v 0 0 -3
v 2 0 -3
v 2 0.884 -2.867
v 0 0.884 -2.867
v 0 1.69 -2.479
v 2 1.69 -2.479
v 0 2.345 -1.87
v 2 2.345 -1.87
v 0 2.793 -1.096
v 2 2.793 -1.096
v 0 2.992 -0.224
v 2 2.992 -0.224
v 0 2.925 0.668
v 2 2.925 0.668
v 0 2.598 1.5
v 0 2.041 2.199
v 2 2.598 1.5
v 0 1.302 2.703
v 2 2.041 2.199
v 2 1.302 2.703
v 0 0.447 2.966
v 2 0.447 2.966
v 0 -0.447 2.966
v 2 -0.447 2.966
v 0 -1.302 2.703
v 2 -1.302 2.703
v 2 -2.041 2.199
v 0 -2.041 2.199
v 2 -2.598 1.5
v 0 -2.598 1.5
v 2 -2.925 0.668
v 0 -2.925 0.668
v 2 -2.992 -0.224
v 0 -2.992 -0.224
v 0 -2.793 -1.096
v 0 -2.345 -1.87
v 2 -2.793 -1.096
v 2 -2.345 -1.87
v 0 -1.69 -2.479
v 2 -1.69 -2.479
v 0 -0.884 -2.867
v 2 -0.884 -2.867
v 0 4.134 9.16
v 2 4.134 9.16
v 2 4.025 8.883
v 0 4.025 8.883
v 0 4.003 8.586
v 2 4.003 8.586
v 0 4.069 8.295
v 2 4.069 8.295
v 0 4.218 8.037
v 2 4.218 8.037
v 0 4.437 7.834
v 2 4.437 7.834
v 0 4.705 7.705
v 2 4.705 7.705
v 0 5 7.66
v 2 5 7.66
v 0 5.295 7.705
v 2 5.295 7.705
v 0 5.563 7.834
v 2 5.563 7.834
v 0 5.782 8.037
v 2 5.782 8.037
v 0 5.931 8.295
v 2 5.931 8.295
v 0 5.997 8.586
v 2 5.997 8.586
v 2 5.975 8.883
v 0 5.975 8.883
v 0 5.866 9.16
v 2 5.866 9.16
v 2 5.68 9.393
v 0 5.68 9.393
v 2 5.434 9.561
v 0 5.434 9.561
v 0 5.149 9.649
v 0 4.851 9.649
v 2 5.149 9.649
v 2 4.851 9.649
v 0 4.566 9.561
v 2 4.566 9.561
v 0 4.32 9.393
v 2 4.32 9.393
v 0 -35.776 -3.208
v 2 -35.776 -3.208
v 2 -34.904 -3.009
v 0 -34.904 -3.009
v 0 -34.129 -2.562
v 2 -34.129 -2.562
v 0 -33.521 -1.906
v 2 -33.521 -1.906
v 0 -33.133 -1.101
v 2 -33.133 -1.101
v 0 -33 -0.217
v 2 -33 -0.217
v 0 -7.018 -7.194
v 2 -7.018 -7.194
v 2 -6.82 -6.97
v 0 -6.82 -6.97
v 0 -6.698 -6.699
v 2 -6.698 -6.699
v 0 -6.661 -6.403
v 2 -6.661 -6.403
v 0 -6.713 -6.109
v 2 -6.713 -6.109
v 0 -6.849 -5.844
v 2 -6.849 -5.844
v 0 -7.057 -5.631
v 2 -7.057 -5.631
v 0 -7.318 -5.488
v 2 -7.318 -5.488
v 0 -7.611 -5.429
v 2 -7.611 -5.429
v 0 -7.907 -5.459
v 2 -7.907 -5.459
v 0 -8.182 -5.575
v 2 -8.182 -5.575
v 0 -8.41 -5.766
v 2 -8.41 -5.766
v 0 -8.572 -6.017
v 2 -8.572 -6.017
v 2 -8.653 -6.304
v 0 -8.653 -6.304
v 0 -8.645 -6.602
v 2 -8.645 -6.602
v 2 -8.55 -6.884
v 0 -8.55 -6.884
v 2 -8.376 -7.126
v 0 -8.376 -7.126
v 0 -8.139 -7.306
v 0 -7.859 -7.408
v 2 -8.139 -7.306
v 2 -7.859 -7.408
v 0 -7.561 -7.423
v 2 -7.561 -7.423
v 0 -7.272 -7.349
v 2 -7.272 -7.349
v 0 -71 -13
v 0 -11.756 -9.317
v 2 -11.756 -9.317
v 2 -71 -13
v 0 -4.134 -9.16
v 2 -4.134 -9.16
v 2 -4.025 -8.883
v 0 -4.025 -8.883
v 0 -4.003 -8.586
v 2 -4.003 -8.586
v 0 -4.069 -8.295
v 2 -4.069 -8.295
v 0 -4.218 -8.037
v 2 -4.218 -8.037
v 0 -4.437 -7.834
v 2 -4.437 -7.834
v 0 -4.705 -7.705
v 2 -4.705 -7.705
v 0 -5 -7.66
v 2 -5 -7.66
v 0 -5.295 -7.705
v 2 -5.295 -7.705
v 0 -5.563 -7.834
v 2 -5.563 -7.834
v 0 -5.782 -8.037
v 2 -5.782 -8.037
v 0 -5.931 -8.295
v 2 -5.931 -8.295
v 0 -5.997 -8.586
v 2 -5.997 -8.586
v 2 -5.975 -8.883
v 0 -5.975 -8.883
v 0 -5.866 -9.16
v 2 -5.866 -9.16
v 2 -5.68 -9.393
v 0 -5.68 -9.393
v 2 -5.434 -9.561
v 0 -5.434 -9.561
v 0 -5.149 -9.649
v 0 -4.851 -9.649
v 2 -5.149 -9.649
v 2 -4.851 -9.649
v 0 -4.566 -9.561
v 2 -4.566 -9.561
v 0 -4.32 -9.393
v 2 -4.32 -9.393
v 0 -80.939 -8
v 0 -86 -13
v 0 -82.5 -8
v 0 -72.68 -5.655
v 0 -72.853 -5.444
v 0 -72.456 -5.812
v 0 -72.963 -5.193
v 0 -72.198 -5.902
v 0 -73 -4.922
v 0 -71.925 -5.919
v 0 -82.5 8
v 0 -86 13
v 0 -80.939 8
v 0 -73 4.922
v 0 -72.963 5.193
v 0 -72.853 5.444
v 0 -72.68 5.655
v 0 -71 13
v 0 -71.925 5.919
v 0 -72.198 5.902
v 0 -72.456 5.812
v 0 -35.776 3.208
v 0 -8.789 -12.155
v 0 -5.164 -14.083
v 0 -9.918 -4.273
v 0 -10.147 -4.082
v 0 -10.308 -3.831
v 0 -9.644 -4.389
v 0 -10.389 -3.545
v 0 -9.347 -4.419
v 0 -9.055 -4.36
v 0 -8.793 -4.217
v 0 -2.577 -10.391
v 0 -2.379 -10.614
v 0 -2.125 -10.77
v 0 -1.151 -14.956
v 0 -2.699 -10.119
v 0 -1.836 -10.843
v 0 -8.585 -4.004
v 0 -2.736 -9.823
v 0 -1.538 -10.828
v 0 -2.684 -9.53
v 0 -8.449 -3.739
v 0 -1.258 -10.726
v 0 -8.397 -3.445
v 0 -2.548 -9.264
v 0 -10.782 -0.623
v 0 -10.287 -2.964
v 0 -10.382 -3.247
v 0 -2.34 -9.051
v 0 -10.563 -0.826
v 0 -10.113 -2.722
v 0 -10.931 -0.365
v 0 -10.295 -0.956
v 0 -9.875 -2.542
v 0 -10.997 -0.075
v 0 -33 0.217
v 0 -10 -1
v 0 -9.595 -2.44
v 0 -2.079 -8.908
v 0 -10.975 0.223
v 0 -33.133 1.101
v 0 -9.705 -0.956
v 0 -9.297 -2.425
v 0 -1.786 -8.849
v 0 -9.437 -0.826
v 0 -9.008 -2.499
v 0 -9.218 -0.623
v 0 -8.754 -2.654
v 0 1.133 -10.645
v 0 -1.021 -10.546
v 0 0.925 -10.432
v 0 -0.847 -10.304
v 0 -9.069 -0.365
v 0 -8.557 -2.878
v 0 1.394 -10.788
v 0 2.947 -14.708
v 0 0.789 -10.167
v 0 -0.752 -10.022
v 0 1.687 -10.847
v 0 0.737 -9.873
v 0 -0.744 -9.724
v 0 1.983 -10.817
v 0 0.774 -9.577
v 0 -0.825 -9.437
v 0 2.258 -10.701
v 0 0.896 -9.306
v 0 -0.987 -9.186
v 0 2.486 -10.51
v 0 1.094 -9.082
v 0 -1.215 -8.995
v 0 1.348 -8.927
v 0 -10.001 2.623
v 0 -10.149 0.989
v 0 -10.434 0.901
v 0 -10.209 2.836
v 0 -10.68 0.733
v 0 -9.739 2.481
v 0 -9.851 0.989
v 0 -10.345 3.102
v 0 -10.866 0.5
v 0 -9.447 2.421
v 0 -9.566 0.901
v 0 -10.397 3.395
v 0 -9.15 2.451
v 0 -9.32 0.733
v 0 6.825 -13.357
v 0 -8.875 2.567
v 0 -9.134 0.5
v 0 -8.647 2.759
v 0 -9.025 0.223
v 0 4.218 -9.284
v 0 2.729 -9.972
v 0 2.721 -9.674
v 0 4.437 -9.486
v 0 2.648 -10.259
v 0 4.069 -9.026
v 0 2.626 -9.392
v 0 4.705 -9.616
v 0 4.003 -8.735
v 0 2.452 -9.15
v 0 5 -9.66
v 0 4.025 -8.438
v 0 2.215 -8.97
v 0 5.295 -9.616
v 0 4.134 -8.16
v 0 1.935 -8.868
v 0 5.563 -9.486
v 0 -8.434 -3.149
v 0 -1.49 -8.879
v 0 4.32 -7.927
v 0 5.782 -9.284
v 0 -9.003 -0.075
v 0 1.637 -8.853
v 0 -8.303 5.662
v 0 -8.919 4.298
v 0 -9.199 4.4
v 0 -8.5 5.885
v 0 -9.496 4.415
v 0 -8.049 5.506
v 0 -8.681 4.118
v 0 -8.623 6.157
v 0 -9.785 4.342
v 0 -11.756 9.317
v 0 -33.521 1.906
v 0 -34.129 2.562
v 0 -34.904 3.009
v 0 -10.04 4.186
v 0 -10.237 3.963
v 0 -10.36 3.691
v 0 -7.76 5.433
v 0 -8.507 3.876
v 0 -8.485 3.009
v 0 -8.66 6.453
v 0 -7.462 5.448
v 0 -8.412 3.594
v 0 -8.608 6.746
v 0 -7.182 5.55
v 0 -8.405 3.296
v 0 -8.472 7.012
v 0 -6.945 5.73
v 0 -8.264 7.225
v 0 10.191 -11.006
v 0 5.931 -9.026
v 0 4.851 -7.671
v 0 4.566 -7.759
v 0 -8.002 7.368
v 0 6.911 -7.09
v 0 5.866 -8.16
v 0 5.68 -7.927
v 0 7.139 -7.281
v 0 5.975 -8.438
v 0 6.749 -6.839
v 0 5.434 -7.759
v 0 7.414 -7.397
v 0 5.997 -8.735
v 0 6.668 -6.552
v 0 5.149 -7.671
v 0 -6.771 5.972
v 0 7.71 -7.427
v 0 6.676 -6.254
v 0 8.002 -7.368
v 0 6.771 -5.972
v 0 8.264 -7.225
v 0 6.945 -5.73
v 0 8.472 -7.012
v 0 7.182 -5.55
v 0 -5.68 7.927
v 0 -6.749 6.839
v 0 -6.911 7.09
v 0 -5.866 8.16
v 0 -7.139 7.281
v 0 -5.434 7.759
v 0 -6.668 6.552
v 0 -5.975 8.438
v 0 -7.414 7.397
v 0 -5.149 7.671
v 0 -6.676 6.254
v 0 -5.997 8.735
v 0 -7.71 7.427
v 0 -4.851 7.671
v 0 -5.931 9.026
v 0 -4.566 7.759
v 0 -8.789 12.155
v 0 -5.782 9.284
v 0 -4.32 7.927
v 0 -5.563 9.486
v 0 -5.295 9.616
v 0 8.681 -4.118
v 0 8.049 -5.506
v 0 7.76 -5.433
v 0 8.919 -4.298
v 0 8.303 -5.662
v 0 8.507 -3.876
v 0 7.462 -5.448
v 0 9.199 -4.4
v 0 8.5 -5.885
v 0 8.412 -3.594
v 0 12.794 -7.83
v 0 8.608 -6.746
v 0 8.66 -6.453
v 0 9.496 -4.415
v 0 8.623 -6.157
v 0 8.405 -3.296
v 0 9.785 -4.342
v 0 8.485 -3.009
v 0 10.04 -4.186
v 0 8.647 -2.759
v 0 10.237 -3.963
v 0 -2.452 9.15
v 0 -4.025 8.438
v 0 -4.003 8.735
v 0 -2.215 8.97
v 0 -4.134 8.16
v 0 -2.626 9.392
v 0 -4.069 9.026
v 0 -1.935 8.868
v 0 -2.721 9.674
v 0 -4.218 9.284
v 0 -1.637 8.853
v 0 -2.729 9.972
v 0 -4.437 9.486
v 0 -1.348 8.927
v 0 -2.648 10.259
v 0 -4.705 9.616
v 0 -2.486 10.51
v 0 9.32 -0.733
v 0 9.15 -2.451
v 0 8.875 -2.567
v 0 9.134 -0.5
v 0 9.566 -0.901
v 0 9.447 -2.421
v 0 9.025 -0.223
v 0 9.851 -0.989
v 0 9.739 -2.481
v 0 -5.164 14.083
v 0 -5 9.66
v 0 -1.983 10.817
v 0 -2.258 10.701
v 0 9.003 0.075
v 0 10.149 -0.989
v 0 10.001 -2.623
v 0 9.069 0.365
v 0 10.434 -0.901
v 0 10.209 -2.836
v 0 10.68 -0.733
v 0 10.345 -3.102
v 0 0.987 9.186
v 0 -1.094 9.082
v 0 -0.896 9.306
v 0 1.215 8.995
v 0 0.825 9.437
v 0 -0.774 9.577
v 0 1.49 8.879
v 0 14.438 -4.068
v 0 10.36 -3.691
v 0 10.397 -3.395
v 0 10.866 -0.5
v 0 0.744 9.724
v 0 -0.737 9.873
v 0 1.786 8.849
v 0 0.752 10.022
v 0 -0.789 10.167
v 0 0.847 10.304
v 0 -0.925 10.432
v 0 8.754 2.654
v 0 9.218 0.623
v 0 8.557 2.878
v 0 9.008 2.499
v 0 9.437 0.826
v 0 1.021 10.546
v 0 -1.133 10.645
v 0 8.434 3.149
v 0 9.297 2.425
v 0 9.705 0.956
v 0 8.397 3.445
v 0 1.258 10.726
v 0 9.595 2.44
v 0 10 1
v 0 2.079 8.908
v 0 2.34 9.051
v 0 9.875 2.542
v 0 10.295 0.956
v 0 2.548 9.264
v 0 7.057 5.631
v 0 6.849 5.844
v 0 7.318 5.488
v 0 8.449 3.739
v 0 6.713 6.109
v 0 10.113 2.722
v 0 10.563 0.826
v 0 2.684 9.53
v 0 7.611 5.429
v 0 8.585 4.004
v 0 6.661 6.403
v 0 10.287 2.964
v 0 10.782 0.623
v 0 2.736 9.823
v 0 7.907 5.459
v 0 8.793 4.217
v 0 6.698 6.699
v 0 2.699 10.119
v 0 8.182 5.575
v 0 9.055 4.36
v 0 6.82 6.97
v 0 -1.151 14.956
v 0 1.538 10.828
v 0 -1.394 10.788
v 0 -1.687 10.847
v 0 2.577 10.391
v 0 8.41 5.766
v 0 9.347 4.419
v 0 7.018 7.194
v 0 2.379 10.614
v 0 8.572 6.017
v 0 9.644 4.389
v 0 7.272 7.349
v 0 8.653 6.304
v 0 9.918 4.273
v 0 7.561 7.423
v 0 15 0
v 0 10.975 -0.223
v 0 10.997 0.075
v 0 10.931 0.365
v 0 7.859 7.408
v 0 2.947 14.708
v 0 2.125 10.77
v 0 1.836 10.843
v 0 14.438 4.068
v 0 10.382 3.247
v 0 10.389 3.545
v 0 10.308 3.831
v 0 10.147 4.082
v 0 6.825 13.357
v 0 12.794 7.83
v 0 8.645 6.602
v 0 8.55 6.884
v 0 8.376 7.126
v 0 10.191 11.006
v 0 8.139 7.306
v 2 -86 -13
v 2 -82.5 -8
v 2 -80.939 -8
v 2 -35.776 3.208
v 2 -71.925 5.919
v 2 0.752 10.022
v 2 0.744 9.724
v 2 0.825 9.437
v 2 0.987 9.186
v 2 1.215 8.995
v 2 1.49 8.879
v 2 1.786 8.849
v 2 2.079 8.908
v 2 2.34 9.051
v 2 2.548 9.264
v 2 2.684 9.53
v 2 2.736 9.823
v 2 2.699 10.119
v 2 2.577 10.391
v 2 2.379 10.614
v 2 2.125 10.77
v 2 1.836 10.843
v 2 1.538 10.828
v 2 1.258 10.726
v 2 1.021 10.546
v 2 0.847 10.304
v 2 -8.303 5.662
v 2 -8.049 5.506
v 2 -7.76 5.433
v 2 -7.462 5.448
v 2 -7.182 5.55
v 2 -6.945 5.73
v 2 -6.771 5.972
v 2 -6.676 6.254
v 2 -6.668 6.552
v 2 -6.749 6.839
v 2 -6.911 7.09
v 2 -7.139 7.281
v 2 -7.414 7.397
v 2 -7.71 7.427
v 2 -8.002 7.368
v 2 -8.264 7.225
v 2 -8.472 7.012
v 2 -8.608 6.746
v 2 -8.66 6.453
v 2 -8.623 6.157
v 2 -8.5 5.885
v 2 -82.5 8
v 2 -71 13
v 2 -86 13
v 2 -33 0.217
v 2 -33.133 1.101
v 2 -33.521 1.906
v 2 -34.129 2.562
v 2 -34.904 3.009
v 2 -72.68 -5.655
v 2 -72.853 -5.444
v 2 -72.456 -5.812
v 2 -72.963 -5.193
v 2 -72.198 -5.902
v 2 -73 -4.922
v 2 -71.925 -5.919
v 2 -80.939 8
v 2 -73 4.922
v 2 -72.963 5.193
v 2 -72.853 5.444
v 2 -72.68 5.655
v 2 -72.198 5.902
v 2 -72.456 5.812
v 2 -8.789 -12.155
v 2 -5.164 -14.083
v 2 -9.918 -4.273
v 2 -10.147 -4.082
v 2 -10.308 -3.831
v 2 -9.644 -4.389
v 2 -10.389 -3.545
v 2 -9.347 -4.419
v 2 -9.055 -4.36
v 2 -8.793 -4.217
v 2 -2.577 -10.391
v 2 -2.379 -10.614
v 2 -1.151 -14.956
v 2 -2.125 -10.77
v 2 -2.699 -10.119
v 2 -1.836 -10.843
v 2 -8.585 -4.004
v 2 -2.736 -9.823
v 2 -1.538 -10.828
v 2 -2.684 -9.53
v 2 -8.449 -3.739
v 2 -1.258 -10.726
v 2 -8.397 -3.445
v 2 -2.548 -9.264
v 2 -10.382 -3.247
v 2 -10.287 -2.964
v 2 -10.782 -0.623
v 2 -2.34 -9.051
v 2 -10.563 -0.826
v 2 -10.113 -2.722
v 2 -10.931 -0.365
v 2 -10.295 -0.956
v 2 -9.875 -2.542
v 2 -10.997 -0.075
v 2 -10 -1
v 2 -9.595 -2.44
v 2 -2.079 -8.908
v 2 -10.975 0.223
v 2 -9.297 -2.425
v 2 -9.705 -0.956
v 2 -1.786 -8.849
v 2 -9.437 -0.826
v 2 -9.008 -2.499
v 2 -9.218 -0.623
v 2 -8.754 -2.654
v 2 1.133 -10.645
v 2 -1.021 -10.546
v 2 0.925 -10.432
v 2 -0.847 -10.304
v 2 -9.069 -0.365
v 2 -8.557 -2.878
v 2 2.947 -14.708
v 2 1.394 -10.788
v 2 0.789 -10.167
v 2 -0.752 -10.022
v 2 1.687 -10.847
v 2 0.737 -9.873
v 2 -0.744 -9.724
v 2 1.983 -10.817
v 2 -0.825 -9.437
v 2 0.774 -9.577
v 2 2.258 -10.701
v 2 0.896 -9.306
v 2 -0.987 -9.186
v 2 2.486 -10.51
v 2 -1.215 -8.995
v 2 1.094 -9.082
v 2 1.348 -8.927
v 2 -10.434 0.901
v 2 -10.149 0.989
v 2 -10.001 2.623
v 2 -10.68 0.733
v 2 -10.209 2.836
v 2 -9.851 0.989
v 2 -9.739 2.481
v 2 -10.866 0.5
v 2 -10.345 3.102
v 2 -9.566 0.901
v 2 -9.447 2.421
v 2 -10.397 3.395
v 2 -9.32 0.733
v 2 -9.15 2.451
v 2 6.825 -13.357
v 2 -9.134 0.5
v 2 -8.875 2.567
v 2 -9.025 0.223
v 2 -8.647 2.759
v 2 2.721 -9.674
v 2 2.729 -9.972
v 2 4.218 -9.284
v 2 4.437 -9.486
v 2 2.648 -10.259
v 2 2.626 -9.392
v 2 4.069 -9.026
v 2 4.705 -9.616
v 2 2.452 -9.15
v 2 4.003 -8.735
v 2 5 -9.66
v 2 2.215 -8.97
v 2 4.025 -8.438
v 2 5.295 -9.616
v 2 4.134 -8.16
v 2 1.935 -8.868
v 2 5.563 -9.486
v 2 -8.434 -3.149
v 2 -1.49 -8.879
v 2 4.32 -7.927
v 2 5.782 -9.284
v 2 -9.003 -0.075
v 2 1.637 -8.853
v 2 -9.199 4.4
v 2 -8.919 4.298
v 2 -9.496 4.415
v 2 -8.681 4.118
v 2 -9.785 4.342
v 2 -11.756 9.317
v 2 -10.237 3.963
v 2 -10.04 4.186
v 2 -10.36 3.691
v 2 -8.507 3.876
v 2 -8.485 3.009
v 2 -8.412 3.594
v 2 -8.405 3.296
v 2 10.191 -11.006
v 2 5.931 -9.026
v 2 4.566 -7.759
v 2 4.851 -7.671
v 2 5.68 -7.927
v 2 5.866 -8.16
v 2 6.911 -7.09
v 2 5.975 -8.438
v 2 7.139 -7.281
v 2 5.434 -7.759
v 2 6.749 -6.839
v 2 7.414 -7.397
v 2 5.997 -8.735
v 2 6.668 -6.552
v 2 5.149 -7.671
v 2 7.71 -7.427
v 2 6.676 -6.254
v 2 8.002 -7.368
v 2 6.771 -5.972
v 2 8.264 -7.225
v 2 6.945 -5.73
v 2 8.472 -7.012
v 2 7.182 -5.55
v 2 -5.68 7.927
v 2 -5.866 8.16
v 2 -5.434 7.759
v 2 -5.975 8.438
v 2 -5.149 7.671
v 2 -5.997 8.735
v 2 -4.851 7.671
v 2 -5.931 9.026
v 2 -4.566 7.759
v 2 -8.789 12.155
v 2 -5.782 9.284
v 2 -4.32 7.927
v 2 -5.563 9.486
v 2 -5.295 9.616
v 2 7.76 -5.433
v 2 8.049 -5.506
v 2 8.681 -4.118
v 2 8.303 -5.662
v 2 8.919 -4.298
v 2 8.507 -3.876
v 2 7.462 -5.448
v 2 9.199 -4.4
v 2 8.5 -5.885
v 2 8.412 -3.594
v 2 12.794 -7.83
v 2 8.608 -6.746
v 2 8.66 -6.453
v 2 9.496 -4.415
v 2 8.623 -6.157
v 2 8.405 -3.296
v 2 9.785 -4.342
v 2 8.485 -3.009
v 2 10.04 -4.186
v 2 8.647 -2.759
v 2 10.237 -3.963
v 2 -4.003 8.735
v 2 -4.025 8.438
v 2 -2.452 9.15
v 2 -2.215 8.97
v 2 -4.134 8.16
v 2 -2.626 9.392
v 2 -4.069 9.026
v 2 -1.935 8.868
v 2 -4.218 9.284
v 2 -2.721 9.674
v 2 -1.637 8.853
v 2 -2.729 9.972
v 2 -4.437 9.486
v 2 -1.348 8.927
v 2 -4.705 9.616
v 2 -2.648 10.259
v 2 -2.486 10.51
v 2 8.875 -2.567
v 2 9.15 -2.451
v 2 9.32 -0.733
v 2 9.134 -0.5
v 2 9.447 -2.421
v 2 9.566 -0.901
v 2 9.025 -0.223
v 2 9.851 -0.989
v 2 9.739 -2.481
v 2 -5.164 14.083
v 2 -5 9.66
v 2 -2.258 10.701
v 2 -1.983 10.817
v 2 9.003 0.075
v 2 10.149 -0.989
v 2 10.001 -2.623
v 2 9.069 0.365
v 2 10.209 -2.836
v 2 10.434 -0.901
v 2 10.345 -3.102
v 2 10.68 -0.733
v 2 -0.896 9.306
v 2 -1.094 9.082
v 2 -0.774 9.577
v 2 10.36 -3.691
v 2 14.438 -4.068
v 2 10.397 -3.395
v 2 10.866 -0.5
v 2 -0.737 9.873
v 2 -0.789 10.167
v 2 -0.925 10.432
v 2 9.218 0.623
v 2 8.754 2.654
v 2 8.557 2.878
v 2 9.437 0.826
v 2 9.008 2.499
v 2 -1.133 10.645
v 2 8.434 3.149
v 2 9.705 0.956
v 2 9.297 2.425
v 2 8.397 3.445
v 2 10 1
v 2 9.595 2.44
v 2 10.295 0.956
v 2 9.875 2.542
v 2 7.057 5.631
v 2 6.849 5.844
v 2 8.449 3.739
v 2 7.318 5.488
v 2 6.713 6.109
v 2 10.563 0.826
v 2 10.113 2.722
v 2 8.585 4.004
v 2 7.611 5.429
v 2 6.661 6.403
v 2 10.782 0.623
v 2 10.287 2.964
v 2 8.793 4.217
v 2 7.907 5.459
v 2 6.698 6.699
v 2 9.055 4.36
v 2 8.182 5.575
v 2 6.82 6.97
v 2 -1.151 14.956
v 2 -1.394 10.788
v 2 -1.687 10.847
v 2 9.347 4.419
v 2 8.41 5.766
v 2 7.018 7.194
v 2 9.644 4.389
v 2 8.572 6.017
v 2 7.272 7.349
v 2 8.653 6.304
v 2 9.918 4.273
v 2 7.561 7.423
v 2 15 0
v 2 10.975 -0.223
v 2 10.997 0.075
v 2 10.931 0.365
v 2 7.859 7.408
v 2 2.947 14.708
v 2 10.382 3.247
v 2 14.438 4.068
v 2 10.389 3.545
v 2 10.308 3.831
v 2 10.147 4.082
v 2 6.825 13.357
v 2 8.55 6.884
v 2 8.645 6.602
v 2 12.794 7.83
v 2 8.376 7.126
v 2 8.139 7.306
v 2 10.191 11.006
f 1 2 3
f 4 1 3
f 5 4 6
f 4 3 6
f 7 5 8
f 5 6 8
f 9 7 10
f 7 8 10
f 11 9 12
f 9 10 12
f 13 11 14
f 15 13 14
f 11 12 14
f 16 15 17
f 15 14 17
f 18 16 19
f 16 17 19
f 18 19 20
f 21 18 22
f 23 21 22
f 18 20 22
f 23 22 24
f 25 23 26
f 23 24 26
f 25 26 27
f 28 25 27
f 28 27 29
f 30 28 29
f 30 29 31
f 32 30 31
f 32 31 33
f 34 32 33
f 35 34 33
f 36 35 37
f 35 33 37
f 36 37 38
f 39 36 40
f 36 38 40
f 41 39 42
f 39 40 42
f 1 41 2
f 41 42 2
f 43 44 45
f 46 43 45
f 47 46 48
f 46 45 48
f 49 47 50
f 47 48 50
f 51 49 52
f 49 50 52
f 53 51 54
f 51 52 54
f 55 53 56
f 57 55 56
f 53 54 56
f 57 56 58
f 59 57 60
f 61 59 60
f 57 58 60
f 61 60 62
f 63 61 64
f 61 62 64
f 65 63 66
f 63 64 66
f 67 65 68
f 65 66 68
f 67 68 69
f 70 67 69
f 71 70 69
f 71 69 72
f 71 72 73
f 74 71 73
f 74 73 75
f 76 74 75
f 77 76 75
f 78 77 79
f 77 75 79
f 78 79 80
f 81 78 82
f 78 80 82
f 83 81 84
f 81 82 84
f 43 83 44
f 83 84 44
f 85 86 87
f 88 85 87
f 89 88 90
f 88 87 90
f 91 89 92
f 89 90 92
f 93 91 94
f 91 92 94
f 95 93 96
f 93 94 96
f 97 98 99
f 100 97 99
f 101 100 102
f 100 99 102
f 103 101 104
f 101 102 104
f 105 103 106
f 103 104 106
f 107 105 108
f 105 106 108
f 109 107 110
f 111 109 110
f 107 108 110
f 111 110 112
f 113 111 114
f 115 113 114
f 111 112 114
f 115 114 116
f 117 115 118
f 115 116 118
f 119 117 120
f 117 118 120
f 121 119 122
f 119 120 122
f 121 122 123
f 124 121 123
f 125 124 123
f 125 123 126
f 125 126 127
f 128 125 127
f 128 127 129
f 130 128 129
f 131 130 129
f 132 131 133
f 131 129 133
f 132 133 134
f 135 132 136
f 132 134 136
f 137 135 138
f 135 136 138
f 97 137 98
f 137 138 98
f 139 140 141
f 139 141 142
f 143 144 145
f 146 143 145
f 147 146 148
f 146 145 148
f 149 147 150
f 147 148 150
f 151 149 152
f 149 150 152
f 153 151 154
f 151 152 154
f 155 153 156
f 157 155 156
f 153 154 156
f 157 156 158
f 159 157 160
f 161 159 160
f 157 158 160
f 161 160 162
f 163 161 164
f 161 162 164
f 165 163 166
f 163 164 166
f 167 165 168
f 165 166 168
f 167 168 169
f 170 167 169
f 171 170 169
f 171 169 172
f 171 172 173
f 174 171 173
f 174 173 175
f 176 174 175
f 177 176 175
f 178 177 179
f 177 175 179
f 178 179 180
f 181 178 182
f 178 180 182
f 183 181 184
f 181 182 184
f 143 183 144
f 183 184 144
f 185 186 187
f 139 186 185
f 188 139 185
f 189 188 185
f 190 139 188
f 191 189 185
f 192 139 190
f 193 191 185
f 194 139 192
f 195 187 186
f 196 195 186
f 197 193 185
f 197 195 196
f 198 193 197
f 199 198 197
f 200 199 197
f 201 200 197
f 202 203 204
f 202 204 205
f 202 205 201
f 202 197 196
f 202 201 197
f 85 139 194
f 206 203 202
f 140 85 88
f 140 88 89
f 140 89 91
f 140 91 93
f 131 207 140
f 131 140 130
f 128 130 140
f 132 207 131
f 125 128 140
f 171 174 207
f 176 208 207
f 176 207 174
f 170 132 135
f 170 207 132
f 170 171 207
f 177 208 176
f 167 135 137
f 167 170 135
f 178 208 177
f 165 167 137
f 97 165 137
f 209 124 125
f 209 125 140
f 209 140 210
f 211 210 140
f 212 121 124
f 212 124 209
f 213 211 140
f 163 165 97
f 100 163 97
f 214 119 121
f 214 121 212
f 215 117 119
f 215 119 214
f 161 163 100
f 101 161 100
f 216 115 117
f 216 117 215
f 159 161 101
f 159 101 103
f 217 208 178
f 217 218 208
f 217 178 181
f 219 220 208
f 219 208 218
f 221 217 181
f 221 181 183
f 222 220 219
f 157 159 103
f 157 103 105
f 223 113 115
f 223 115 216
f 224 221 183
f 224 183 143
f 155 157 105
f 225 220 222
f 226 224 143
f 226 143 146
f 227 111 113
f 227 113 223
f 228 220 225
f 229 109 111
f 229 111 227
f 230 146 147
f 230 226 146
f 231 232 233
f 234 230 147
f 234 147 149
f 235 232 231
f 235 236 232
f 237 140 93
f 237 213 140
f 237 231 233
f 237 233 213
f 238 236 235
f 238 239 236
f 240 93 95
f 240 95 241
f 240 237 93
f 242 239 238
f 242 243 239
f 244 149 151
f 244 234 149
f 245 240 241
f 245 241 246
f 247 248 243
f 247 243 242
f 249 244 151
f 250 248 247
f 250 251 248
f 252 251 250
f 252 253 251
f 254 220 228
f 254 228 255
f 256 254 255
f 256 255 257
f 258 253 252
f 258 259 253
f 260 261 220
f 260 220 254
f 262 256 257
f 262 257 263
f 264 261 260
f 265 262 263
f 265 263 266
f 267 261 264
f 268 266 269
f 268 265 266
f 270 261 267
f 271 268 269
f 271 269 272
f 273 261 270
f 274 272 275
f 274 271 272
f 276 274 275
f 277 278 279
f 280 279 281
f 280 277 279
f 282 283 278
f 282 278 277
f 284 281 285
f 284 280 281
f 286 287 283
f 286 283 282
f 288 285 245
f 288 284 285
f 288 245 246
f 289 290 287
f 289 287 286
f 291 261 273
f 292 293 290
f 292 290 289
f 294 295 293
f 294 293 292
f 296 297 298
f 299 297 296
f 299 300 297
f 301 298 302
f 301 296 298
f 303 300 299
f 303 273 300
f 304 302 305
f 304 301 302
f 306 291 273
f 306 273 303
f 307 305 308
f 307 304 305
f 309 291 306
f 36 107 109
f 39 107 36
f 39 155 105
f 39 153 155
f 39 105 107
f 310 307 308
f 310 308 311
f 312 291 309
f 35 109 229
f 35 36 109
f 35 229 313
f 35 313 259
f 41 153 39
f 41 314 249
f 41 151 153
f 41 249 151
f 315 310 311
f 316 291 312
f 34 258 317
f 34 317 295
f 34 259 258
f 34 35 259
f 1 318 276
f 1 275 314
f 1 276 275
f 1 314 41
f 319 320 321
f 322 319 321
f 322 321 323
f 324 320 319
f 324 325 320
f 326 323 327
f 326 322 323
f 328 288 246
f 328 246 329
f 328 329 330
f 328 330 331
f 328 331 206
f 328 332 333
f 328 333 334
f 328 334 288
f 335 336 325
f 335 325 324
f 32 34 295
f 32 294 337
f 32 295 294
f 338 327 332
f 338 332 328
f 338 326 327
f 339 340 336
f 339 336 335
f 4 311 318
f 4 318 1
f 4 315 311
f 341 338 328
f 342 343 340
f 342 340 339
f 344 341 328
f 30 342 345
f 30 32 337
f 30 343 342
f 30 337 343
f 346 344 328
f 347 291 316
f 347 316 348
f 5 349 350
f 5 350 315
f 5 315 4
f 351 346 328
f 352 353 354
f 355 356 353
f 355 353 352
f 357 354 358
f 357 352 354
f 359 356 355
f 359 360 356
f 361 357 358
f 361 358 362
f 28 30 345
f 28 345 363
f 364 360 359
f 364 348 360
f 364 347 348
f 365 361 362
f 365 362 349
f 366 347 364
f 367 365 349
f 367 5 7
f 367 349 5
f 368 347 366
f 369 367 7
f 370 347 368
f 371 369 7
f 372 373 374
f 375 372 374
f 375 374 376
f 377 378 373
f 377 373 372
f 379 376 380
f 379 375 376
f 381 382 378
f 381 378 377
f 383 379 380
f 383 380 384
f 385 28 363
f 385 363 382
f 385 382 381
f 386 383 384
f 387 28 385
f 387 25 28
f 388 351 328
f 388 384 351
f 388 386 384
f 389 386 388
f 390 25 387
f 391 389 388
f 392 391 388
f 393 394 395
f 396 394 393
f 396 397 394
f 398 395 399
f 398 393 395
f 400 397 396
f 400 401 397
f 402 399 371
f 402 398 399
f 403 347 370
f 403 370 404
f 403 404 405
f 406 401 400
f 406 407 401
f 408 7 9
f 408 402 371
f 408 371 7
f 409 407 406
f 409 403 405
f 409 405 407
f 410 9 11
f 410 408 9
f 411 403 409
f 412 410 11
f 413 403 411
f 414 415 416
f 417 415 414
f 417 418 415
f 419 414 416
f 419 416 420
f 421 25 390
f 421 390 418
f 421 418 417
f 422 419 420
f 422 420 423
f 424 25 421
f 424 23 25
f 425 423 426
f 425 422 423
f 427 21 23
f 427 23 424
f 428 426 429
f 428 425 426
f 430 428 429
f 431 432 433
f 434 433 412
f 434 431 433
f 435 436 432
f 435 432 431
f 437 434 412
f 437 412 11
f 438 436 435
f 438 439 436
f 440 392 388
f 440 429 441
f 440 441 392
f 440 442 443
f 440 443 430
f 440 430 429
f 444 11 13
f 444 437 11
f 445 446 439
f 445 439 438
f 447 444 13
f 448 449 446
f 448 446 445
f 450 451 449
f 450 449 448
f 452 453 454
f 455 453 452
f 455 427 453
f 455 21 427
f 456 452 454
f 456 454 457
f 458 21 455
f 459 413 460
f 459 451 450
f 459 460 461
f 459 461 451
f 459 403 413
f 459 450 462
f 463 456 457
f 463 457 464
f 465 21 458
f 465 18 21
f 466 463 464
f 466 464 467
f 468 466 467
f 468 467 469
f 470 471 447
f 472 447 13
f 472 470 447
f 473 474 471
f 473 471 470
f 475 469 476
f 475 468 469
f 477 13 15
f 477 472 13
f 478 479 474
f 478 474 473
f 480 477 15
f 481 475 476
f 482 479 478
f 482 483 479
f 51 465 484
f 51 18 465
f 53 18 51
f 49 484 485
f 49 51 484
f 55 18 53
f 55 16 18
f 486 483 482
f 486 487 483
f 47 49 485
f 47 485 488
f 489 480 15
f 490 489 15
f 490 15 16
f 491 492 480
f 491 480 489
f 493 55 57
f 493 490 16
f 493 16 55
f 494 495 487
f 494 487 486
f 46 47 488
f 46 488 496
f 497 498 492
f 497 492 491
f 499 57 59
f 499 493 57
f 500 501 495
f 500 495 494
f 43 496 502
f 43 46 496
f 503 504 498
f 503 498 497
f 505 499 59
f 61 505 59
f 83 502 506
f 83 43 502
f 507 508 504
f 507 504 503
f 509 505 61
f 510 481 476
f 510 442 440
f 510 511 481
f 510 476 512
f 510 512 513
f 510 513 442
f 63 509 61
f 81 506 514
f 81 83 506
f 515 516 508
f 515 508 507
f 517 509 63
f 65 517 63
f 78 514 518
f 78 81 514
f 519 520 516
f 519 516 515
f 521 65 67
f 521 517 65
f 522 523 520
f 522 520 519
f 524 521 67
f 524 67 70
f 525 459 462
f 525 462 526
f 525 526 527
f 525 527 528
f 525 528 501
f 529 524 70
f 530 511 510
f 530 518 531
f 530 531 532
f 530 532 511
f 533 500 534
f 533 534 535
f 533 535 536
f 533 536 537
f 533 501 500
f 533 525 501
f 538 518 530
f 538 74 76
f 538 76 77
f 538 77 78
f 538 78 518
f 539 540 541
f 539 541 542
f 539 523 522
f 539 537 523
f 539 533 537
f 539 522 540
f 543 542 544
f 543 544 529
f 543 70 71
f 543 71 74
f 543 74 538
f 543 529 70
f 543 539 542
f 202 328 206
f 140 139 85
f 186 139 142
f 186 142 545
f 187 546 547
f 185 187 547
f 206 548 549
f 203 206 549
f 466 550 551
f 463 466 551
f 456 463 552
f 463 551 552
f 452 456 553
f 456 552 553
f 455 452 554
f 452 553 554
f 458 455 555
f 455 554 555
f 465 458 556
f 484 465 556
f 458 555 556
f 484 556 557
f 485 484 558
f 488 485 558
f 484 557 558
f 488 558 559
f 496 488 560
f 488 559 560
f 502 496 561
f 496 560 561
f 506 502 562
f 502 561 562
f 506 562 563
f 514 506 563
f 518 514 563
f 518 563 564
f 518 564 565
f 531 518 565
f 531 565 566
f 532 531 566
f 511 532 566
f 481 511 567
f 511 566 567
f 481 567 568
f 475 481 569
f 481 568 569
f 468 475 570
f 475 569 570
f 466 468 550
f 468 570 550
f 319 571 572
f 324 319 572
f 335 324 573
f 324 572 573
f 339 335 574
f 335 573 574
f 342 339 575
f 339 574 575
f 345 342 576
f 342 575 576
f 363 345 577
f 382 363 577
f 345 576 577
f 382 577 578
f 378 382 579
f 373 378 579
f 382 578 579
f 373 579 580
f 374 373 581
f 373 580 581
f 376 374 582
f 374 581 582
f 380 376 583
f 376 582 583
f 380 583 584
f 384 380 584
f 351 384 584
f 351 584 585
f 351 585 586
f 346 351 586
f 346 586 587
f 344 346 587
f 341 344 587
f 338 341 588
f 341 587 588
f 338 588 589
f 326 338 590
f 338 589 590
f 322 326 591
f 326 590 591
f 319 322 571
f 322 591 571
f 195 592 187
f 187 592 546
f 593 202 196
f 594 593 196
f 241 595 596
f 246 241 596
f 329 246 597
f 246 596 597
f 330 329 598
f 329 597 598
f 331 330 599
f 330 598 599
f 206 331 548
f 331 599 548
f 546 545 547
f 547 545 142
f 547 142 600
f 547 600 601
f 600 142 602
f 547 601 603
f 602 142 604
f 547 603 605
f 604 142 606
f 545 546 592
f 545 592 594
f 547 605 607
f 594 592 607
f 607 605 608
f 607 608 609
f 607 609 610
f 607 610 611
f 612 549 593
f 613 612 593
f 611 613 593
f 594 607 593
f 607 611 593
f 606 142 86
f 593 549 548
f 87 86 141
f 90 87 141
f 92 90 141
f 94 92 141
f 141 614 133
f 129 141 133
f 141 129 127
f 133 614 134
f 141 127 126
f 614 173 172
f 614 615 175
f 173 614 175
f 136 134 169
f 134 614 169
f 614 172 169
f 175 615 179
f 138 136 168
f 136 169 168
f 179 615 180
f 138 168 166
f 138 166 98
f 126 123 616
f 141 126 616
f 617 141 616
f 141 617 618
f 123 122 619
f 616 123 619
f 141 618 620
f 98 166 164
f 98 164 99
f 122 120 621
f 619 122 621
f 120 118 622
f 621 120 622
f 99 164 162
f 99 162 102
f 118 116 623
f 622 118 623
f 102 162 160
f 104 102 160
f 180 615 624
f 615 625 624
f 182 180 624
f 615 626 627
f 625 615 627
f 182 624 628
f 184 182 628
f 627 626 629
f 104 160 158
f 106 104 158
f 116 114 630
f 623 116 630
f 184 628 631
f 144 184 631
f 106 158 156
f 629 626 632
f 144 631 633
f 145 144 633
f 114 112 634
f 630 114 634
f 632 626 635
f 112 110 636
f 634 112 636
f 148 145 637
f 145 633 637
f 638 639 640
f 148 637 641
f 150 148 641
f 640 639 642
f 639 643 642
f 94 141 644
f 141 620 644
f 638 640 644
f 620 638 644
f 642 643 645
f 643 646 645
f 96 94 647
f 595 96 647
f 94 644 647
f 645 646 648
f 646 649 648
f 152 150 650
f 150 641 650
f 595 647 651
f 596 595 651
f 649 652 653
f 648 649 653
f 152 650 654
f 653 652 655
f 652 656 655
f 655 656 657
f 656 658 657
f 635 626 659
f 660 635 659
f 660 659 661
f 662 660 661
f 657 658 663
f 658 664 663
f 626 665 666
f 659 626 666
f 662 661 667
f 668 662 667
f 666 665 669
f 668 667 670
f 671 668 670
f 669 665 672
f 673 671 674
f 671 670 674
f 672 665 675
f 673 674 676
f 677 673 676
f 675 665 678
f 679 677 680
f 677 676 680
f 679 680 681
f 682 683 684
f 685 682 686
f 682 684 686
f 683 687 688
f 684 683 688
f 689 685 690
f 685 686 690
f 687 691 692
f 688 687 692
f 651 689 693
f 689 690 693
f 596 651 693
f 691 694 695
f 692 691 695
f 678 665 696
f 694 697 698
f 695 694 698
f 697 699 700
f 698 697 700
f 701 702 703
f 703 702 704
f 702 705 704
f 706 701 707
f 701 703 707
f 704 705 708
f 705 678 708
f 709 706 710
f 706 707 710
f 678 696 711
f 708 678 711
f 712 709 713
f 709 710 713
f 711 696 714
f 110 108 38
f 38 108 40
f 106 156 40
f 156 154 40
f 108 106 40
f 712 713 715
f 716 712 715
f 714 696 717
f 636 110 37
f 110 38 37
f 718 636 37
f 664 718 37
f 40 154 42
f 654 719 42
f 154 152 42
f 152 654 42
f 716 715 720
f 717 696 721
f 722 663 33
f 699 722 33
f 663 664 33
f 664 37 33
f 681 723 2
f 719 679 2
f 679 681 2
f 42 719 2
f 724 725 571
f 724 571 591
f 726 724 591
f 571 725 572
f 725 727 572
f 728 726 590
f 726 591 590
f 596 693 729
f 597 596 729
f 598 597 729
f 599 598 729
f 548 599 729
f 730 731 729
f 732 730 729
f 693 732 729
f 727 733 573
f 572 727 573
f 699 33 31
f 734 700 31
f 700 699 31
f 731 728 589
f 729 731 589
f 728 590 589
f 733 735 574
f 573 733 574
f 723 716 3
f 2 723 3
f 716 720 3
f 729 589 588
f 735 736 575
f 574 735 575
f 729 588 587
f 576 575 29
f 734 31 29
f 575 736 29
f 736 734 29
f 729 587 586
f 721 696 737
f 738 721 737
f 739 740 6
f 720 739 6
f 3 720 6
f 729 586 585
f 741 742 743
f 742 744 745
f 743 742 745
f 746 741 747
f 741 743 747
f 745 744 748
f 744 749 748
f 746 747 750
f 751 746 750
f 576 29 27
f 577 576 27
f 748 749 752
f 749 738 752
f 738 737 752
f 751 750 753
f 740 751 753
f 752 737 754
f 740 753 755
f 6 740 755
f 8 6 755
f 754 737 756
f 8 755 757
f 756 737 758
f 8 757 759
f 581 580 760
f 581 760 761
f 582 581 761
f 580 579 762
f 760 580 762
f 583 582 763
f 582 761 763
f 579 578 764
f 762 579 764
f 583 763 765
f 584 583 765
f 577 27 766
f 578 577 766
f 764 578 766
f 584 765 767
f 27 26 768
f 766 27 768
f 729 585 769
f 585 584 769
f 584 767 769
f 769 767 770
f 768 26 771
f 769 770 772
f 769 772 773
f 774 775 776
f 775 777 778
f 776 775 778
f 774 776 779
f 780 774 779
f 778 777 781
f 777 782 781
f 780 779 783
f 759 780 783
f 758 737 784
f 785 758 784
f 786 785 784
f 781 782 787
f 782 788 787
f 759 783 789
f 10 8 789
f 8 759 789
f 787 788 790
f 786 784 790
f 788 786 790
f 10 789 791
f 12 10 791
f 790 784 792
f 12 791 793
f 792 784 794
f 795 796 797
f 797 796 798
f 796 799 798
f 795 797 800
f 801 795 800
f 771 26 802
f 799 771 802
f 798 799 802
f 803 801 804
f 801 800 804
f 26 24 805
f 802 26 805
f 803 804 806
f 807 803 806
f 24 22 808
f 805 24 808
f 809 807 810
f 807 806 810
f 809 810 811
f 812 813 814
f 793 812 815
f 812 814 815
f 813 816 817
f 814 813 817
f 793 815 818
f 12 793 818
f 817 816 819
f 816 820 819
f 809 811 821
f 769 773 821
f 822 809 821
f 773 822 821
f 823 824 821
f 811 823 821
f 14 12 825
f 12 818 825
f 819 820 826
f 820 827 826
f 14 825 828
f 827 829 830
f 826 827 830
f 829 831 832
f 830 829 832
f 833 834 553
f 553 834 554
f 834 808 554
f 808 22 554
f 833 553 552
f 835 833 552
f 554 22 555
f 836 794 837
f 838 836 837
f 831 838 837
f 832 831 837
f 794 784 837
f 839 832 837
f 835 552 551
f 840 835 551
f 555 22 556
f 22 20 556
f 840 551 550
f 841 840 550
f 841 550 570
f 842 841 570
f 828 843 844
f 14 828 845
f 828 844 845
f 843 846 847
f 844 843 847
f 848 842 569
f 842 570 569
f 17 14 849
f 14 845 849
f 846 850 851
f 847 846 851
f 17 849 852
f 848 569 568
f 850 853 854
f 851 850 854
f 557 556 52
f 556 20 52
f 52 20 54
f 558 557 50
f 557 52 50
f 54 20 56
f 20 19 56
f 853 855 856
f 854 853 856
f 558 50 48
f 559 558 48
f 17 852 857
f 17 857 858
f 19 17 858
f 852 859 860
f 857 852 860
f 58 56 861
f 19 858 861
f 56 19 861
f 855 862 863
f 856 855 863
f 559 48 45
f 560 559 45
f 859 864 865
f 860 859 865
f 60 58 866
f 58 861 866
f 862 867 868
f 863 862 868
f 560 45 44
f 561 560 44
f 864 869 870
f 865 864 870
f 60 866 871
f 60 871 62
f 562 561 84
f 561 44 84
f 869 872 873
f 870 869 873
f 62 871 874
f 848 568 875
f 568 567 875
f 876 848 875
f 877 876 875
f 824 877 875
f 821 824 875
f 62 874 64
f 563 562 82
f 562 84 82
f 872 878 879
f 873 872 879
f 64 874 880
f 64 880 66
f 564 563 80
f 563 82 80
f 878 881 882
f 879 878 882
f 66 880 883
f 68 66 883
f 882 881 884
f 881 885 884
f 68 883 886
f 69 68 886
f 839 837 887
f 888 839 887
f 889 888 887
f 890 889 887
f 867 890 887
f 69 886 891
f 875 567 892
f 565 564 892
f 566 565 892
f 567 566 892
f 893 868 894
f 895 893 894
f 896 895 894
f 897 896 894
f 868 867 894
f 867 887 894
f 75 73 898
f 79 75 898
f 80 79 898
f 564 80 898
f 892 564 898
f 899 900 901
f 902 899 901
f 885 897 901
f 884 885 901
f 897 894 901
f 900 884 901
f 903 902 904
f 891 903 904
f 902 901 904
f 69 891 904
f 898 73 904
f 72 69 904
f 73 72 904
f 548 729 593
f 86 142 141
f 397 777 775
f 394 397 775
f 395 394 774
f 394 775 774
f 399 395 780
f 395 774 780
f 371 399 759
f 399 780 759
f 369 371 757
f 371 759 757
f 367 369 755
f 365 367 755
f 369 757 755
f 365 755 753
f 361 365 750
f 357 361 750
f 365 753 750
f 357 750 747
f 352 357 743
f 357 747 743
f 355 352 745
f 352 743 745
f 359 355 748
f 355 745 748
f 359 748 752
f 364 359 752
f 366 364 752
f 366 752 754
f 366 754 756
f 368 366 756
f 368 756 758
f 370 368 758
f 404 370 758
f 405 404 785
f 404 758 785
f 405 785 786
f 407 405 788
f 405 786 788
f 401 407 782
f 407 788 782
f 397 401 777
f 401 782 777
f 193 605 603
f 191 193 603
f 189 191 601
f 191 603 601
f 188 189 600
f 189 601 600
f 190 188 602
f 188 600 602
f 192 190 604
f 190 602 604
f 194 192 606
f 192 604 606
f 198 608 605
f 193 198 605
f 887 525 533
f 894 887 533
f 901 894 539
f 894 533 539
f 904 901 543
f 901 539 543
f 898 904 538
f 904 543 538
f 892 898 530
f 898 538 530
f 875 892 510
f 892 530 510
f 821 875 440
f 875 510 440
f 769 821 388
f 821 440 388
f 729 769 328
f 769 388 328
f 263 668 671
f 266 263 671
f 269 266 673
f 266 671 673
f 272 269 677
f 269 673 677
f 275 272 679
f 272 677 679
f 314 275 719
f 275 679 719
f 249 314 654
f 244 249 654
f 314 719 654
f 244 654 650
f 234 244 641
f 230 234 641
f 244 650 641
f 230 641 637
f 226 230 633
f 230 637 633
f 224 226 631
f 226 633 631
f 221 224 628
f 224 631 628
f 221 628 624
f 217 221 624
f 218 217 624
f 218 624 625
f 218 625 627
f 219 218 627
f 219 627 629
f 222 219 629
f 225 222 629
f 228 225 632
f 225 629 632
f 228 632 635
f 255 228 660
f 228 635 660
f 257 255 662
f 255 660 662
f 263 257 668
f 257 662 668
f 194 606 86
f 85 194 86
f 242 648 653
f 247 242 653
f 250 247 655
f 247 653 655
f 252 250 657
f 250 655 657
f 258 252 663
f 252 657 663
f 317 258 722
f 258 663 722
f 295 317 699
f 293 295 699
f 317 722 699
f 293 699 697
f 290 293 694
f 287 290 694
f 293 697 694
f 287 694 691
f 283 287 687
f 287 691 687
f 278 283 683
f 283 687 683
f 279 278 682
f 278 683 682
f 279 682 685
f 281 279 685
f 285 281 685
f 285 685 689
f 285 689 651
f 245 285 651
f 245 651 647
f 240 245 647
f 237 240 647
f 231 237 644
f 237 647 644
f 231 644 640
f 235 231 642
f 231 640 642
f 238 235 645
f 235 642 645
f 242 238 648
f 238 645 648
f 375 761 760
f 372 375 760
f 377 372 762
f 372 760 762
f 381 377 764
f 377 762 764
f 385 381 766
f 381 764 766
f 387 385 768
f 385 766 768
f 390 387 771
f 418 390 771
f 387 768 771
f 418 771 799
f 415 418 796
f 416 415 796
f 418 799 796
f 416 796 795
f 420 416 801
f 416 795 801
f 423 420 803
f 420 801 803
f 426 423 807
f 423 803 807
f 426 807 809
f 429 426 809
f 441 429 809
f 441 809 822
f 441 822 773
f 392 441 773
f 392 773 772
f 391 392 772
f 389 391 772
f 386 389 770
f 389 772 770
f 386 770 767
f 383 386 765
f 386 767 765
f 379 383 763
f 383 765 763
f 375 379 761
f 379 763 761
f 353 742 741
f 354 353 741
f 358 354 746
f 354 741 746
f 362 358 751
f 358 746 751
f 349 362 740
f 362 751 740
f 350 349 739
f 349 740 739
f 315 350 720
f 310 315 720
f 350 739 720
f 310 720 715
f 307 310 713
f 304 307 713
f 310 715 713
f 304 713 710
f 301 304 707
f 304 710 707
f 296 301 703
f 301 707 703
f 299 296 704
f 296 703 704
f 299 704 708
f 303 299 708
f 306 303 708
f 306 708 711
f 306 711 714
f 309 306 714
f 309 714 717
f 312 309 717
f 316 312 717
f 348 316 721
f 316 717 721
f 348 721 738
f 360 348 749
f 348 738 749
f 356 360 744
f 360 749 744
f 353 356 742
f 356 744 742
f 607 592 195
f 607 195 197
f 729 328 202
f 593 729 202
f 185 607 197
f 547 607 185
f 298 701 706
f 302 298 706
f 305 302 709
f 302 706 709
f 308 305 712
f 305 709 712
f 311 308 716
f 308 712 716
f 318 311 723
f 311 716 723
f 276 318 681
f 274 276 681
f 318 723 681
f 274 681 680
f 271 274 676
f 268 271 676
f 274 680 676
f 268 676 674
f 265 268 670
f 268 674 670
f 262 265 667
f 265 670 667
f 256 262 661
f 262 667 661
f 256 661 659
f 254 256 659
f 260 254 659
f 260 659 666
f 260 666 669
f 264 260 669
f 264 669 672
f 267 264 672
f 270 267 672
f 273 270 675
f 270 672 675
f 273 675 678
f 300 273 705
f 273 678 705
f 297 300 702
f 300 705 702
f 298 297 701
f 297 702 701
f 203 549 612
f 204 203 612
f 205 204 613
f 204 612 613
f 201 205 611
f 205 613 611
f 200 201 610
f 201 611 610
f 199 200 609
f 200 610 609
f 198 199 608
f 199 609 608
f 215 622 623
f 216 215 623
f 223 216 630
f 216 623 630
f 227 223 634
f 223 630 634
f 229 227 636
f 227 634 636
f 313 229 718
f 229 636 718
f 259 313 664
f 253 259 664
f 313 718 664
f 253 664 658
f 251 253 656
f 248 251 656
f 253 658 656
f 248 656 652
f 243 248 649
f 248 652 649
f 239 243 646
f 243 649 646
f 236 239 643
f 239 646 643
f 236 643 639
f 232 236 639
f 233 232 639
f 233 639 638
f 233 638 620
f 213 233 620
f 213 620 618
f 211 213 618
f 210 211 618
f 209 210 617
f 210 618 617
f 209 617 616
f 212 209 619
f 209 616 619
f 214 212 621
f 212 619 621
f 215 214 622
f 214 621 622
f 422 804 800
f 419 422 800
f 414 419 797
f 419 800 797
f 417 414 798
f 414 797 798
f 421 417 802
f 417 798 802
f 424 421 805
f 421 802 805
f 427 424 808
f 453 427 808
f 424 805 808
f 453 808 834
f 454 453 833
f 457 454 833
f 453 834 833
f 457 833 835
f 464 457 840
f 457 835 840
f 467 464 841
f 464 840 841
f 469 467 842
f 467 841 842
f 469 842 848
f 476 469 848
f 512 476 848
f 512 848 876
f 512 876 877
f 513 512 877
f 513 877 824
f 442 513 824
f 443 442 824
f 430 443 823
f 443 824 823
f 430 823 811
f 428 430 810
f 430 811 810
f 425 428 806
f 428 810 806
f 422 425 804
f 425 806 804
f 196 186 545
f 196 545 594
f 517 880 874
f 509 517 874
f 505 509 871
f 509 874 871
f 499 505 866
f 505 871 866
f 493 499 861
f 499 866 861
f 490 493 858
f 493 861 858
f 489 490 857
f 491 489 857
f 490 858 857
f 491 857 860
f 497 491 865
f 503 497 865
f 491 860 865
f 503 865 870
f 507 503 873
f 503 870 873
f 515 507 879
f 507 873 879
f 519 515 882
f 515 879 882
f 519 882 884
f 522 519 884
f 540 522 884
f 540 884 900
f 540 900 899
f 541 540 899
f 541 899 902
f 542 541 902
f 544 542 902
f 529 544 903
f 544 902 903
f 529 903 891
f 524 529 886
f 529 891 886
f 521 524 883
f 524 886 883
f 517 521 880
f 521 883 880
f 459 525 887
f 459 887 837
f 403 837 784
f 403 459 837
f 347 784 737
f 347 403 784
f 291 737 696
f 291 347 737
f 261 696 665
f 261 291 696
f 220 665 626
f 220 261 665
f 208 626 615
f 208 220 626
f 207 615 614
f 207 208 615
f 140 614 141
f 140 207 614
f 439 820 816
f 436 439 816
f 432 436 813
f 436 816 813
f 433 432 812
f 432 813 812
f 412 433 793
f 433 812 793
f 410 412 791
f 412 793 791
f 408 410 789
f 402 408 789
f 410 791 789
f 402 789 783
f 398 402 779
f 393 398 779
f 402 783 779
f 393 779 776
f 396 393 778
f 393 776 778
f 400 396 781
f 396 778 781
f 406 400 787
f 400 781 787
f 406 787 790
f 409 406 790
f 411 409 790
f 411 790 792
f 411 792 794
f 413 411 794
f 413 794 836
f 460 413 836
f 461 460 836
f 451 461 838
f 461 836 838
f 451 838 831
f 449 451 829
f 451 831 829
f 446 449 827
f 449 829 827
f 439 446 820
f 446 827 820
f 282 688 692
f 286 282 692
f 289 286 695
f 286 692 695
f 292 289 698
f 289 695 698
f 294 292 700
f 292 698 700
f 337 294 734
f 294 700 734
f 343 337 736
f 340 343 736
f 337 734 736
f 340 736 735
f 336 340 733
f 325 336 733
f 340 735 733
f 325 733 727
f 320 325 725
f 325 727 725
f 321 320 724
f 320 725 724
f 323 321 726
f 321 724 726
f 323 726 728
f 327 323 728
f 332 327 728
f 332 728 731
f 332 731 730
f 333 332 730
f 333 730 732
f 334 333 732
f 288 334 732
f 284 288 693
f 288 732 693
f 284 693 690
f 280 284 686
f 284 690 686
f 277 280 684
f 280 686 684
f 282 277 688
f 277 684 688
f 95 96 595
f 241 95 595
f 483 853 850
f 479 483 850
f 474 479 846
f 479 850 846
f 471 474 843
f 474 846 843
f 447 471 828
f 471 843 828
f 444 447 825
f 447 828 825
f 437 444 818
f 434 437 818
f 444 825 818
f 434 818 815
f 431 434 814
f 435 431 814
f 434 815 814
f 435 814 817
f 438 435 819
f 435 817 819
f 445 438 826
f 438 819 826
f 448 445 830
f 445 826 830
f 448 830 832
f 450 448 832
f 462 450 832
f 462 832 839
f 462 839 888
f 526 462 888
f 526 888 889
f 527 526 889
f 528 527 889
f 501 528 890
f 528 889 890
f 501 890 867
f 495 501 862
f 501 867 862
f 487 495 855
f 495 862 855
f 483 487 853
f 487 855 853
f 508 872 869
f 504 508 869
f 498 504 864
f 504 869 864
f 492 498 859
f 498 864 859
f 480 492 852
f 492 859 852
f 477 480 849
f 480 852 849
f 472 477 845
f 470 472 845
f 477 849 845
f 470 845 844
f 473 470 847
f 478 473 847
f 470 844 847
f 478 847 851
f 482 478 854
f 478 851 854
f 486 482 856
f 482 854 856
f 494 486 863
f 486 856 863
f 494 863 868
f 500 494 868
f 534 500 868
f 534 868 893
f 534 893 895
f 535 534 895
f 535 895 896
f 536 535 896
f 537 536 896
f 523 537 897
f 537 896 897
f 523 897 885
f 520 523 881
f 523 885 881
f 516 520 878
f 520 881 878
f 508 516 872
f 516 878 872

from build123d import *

# Parameters (mm, degrees)
RESSALTO_EXTRUS_O1_DEPTH = 2
ESBO_O2_R                = 3
ESBO_O2_R_2              = 1
CORTE_EXTRUS_O1_DEPTH    = 2
PADR_OCIRCULAR1_COUNT    = 18
ESBO_O3_W                = 16
ESBO_O3_H                = 1.561418551
CORTE_EXTRUS_O2_DEPTH    = 2


with BuildPart() as part:
    # Esboço1 → Ressalto-extrusão1 (new body)
    with BuildSketch(Plane(origin=(0, 0, 0), x_dir=(0, 0, -1), z_dir=(1, 0, 0))):
        with BuildLine():
            Line((-13, -71), (-13, -86))
            Line((-13, -86), (0, -86))
            Line((0, -86), (0, 15))
            ThreePointArc((0, 15), (-14.165790836, 4.932582487), (-9.316524238, -11.755950669))
            add(Edge.make_bspline(
                [(-9.316524238, -11.755950669), (-13, -71)],
                knots=[0, 0, 1, 1], degree=1))
        make_face()
    ressalto_extrus_o1 = extrude(amount=RESSALTO_EXTRUS_O1_DEPTH)

    # Espelhar1: Ressalto-extrusão1 across plane
    add(ressalto_extrus_o1.mirror(Plane(origin=(2, 15, 0), x_dir=(1, 0, 0), z_dir=(0, 0, 1))))

    # Esboço2 → Corte-extrusão1 (cut)
    with BuildSketch(Plane(origin=(2, 0, 0), x_dir=(0, 0, -1), z_dir=(1, 0, 0))):
        Circle(ESBO_O2_R)
        with Locations((0, -10)):
            Circle(ESBO_O2_R_2)
    corte_extrus_o1 = extrude(amount=-CORTE_EXTRUS_O1_DEPTH, mode=Mode.SUBTRACT)

    # PadrãoCircular1: Corte-extrusão1 ×18 about axis
    padr_ocircular1_axis = Axis((0, 0, 0), (1, 0, 0))
    for i in range(1, PADR_OCIRCULAR1_COUNT):
        add(corte_extrus_o1.rotate(padr_ocircular1_axis, i * 360 / PADR_OCIRCULAR1_COUNT), mode=Mode.SUBTRACT)

    # Esboço3 → Corte-extrusão2 (cut)
    with BuildSketch(Plane(origin=(2, 0, 0), x_dir=(0, 0, -1), z_dir=(1, 0, 0))):
        with BuildLine():
            Line((-4.922191444, -73), (4.922191444, -73))
            ThreePointArc((4.922191444, -73), (5.655263728, -72.680150738), (5.919390754, -71.925210052))
            Line((5.919390754, -71.925210052), (3.208172262, -35.775630155))
            ThreePointArc((3.208172262, -35.775630155), (2.257026545, -33.800783147), (0.216574332, -33))
            Line((0.216574332, -33), (-0.216574332, -33))
            ThreePointArc((-0.216574332, -33), (-2.257026545, -33.800783147), (-3.208172262, -35.775630155))
            Line((-3.208172262, -35.775630155), (-5.919390754, -71.925210052))
            ThreePointArc((-5.919390754, -71.925210052), (-5.655263728, -72.680150738), (-4.922191444, -73))
        make_face()
        with Locations((0, -81.719290725)):
            Rectangle(ESBO_O3_W, ESBO_O3_H)
    extrude(amount=-CORTE_EXTRUS_O2_DEPTH, mode=Mode.SUBTRACT)


solid = part.part
